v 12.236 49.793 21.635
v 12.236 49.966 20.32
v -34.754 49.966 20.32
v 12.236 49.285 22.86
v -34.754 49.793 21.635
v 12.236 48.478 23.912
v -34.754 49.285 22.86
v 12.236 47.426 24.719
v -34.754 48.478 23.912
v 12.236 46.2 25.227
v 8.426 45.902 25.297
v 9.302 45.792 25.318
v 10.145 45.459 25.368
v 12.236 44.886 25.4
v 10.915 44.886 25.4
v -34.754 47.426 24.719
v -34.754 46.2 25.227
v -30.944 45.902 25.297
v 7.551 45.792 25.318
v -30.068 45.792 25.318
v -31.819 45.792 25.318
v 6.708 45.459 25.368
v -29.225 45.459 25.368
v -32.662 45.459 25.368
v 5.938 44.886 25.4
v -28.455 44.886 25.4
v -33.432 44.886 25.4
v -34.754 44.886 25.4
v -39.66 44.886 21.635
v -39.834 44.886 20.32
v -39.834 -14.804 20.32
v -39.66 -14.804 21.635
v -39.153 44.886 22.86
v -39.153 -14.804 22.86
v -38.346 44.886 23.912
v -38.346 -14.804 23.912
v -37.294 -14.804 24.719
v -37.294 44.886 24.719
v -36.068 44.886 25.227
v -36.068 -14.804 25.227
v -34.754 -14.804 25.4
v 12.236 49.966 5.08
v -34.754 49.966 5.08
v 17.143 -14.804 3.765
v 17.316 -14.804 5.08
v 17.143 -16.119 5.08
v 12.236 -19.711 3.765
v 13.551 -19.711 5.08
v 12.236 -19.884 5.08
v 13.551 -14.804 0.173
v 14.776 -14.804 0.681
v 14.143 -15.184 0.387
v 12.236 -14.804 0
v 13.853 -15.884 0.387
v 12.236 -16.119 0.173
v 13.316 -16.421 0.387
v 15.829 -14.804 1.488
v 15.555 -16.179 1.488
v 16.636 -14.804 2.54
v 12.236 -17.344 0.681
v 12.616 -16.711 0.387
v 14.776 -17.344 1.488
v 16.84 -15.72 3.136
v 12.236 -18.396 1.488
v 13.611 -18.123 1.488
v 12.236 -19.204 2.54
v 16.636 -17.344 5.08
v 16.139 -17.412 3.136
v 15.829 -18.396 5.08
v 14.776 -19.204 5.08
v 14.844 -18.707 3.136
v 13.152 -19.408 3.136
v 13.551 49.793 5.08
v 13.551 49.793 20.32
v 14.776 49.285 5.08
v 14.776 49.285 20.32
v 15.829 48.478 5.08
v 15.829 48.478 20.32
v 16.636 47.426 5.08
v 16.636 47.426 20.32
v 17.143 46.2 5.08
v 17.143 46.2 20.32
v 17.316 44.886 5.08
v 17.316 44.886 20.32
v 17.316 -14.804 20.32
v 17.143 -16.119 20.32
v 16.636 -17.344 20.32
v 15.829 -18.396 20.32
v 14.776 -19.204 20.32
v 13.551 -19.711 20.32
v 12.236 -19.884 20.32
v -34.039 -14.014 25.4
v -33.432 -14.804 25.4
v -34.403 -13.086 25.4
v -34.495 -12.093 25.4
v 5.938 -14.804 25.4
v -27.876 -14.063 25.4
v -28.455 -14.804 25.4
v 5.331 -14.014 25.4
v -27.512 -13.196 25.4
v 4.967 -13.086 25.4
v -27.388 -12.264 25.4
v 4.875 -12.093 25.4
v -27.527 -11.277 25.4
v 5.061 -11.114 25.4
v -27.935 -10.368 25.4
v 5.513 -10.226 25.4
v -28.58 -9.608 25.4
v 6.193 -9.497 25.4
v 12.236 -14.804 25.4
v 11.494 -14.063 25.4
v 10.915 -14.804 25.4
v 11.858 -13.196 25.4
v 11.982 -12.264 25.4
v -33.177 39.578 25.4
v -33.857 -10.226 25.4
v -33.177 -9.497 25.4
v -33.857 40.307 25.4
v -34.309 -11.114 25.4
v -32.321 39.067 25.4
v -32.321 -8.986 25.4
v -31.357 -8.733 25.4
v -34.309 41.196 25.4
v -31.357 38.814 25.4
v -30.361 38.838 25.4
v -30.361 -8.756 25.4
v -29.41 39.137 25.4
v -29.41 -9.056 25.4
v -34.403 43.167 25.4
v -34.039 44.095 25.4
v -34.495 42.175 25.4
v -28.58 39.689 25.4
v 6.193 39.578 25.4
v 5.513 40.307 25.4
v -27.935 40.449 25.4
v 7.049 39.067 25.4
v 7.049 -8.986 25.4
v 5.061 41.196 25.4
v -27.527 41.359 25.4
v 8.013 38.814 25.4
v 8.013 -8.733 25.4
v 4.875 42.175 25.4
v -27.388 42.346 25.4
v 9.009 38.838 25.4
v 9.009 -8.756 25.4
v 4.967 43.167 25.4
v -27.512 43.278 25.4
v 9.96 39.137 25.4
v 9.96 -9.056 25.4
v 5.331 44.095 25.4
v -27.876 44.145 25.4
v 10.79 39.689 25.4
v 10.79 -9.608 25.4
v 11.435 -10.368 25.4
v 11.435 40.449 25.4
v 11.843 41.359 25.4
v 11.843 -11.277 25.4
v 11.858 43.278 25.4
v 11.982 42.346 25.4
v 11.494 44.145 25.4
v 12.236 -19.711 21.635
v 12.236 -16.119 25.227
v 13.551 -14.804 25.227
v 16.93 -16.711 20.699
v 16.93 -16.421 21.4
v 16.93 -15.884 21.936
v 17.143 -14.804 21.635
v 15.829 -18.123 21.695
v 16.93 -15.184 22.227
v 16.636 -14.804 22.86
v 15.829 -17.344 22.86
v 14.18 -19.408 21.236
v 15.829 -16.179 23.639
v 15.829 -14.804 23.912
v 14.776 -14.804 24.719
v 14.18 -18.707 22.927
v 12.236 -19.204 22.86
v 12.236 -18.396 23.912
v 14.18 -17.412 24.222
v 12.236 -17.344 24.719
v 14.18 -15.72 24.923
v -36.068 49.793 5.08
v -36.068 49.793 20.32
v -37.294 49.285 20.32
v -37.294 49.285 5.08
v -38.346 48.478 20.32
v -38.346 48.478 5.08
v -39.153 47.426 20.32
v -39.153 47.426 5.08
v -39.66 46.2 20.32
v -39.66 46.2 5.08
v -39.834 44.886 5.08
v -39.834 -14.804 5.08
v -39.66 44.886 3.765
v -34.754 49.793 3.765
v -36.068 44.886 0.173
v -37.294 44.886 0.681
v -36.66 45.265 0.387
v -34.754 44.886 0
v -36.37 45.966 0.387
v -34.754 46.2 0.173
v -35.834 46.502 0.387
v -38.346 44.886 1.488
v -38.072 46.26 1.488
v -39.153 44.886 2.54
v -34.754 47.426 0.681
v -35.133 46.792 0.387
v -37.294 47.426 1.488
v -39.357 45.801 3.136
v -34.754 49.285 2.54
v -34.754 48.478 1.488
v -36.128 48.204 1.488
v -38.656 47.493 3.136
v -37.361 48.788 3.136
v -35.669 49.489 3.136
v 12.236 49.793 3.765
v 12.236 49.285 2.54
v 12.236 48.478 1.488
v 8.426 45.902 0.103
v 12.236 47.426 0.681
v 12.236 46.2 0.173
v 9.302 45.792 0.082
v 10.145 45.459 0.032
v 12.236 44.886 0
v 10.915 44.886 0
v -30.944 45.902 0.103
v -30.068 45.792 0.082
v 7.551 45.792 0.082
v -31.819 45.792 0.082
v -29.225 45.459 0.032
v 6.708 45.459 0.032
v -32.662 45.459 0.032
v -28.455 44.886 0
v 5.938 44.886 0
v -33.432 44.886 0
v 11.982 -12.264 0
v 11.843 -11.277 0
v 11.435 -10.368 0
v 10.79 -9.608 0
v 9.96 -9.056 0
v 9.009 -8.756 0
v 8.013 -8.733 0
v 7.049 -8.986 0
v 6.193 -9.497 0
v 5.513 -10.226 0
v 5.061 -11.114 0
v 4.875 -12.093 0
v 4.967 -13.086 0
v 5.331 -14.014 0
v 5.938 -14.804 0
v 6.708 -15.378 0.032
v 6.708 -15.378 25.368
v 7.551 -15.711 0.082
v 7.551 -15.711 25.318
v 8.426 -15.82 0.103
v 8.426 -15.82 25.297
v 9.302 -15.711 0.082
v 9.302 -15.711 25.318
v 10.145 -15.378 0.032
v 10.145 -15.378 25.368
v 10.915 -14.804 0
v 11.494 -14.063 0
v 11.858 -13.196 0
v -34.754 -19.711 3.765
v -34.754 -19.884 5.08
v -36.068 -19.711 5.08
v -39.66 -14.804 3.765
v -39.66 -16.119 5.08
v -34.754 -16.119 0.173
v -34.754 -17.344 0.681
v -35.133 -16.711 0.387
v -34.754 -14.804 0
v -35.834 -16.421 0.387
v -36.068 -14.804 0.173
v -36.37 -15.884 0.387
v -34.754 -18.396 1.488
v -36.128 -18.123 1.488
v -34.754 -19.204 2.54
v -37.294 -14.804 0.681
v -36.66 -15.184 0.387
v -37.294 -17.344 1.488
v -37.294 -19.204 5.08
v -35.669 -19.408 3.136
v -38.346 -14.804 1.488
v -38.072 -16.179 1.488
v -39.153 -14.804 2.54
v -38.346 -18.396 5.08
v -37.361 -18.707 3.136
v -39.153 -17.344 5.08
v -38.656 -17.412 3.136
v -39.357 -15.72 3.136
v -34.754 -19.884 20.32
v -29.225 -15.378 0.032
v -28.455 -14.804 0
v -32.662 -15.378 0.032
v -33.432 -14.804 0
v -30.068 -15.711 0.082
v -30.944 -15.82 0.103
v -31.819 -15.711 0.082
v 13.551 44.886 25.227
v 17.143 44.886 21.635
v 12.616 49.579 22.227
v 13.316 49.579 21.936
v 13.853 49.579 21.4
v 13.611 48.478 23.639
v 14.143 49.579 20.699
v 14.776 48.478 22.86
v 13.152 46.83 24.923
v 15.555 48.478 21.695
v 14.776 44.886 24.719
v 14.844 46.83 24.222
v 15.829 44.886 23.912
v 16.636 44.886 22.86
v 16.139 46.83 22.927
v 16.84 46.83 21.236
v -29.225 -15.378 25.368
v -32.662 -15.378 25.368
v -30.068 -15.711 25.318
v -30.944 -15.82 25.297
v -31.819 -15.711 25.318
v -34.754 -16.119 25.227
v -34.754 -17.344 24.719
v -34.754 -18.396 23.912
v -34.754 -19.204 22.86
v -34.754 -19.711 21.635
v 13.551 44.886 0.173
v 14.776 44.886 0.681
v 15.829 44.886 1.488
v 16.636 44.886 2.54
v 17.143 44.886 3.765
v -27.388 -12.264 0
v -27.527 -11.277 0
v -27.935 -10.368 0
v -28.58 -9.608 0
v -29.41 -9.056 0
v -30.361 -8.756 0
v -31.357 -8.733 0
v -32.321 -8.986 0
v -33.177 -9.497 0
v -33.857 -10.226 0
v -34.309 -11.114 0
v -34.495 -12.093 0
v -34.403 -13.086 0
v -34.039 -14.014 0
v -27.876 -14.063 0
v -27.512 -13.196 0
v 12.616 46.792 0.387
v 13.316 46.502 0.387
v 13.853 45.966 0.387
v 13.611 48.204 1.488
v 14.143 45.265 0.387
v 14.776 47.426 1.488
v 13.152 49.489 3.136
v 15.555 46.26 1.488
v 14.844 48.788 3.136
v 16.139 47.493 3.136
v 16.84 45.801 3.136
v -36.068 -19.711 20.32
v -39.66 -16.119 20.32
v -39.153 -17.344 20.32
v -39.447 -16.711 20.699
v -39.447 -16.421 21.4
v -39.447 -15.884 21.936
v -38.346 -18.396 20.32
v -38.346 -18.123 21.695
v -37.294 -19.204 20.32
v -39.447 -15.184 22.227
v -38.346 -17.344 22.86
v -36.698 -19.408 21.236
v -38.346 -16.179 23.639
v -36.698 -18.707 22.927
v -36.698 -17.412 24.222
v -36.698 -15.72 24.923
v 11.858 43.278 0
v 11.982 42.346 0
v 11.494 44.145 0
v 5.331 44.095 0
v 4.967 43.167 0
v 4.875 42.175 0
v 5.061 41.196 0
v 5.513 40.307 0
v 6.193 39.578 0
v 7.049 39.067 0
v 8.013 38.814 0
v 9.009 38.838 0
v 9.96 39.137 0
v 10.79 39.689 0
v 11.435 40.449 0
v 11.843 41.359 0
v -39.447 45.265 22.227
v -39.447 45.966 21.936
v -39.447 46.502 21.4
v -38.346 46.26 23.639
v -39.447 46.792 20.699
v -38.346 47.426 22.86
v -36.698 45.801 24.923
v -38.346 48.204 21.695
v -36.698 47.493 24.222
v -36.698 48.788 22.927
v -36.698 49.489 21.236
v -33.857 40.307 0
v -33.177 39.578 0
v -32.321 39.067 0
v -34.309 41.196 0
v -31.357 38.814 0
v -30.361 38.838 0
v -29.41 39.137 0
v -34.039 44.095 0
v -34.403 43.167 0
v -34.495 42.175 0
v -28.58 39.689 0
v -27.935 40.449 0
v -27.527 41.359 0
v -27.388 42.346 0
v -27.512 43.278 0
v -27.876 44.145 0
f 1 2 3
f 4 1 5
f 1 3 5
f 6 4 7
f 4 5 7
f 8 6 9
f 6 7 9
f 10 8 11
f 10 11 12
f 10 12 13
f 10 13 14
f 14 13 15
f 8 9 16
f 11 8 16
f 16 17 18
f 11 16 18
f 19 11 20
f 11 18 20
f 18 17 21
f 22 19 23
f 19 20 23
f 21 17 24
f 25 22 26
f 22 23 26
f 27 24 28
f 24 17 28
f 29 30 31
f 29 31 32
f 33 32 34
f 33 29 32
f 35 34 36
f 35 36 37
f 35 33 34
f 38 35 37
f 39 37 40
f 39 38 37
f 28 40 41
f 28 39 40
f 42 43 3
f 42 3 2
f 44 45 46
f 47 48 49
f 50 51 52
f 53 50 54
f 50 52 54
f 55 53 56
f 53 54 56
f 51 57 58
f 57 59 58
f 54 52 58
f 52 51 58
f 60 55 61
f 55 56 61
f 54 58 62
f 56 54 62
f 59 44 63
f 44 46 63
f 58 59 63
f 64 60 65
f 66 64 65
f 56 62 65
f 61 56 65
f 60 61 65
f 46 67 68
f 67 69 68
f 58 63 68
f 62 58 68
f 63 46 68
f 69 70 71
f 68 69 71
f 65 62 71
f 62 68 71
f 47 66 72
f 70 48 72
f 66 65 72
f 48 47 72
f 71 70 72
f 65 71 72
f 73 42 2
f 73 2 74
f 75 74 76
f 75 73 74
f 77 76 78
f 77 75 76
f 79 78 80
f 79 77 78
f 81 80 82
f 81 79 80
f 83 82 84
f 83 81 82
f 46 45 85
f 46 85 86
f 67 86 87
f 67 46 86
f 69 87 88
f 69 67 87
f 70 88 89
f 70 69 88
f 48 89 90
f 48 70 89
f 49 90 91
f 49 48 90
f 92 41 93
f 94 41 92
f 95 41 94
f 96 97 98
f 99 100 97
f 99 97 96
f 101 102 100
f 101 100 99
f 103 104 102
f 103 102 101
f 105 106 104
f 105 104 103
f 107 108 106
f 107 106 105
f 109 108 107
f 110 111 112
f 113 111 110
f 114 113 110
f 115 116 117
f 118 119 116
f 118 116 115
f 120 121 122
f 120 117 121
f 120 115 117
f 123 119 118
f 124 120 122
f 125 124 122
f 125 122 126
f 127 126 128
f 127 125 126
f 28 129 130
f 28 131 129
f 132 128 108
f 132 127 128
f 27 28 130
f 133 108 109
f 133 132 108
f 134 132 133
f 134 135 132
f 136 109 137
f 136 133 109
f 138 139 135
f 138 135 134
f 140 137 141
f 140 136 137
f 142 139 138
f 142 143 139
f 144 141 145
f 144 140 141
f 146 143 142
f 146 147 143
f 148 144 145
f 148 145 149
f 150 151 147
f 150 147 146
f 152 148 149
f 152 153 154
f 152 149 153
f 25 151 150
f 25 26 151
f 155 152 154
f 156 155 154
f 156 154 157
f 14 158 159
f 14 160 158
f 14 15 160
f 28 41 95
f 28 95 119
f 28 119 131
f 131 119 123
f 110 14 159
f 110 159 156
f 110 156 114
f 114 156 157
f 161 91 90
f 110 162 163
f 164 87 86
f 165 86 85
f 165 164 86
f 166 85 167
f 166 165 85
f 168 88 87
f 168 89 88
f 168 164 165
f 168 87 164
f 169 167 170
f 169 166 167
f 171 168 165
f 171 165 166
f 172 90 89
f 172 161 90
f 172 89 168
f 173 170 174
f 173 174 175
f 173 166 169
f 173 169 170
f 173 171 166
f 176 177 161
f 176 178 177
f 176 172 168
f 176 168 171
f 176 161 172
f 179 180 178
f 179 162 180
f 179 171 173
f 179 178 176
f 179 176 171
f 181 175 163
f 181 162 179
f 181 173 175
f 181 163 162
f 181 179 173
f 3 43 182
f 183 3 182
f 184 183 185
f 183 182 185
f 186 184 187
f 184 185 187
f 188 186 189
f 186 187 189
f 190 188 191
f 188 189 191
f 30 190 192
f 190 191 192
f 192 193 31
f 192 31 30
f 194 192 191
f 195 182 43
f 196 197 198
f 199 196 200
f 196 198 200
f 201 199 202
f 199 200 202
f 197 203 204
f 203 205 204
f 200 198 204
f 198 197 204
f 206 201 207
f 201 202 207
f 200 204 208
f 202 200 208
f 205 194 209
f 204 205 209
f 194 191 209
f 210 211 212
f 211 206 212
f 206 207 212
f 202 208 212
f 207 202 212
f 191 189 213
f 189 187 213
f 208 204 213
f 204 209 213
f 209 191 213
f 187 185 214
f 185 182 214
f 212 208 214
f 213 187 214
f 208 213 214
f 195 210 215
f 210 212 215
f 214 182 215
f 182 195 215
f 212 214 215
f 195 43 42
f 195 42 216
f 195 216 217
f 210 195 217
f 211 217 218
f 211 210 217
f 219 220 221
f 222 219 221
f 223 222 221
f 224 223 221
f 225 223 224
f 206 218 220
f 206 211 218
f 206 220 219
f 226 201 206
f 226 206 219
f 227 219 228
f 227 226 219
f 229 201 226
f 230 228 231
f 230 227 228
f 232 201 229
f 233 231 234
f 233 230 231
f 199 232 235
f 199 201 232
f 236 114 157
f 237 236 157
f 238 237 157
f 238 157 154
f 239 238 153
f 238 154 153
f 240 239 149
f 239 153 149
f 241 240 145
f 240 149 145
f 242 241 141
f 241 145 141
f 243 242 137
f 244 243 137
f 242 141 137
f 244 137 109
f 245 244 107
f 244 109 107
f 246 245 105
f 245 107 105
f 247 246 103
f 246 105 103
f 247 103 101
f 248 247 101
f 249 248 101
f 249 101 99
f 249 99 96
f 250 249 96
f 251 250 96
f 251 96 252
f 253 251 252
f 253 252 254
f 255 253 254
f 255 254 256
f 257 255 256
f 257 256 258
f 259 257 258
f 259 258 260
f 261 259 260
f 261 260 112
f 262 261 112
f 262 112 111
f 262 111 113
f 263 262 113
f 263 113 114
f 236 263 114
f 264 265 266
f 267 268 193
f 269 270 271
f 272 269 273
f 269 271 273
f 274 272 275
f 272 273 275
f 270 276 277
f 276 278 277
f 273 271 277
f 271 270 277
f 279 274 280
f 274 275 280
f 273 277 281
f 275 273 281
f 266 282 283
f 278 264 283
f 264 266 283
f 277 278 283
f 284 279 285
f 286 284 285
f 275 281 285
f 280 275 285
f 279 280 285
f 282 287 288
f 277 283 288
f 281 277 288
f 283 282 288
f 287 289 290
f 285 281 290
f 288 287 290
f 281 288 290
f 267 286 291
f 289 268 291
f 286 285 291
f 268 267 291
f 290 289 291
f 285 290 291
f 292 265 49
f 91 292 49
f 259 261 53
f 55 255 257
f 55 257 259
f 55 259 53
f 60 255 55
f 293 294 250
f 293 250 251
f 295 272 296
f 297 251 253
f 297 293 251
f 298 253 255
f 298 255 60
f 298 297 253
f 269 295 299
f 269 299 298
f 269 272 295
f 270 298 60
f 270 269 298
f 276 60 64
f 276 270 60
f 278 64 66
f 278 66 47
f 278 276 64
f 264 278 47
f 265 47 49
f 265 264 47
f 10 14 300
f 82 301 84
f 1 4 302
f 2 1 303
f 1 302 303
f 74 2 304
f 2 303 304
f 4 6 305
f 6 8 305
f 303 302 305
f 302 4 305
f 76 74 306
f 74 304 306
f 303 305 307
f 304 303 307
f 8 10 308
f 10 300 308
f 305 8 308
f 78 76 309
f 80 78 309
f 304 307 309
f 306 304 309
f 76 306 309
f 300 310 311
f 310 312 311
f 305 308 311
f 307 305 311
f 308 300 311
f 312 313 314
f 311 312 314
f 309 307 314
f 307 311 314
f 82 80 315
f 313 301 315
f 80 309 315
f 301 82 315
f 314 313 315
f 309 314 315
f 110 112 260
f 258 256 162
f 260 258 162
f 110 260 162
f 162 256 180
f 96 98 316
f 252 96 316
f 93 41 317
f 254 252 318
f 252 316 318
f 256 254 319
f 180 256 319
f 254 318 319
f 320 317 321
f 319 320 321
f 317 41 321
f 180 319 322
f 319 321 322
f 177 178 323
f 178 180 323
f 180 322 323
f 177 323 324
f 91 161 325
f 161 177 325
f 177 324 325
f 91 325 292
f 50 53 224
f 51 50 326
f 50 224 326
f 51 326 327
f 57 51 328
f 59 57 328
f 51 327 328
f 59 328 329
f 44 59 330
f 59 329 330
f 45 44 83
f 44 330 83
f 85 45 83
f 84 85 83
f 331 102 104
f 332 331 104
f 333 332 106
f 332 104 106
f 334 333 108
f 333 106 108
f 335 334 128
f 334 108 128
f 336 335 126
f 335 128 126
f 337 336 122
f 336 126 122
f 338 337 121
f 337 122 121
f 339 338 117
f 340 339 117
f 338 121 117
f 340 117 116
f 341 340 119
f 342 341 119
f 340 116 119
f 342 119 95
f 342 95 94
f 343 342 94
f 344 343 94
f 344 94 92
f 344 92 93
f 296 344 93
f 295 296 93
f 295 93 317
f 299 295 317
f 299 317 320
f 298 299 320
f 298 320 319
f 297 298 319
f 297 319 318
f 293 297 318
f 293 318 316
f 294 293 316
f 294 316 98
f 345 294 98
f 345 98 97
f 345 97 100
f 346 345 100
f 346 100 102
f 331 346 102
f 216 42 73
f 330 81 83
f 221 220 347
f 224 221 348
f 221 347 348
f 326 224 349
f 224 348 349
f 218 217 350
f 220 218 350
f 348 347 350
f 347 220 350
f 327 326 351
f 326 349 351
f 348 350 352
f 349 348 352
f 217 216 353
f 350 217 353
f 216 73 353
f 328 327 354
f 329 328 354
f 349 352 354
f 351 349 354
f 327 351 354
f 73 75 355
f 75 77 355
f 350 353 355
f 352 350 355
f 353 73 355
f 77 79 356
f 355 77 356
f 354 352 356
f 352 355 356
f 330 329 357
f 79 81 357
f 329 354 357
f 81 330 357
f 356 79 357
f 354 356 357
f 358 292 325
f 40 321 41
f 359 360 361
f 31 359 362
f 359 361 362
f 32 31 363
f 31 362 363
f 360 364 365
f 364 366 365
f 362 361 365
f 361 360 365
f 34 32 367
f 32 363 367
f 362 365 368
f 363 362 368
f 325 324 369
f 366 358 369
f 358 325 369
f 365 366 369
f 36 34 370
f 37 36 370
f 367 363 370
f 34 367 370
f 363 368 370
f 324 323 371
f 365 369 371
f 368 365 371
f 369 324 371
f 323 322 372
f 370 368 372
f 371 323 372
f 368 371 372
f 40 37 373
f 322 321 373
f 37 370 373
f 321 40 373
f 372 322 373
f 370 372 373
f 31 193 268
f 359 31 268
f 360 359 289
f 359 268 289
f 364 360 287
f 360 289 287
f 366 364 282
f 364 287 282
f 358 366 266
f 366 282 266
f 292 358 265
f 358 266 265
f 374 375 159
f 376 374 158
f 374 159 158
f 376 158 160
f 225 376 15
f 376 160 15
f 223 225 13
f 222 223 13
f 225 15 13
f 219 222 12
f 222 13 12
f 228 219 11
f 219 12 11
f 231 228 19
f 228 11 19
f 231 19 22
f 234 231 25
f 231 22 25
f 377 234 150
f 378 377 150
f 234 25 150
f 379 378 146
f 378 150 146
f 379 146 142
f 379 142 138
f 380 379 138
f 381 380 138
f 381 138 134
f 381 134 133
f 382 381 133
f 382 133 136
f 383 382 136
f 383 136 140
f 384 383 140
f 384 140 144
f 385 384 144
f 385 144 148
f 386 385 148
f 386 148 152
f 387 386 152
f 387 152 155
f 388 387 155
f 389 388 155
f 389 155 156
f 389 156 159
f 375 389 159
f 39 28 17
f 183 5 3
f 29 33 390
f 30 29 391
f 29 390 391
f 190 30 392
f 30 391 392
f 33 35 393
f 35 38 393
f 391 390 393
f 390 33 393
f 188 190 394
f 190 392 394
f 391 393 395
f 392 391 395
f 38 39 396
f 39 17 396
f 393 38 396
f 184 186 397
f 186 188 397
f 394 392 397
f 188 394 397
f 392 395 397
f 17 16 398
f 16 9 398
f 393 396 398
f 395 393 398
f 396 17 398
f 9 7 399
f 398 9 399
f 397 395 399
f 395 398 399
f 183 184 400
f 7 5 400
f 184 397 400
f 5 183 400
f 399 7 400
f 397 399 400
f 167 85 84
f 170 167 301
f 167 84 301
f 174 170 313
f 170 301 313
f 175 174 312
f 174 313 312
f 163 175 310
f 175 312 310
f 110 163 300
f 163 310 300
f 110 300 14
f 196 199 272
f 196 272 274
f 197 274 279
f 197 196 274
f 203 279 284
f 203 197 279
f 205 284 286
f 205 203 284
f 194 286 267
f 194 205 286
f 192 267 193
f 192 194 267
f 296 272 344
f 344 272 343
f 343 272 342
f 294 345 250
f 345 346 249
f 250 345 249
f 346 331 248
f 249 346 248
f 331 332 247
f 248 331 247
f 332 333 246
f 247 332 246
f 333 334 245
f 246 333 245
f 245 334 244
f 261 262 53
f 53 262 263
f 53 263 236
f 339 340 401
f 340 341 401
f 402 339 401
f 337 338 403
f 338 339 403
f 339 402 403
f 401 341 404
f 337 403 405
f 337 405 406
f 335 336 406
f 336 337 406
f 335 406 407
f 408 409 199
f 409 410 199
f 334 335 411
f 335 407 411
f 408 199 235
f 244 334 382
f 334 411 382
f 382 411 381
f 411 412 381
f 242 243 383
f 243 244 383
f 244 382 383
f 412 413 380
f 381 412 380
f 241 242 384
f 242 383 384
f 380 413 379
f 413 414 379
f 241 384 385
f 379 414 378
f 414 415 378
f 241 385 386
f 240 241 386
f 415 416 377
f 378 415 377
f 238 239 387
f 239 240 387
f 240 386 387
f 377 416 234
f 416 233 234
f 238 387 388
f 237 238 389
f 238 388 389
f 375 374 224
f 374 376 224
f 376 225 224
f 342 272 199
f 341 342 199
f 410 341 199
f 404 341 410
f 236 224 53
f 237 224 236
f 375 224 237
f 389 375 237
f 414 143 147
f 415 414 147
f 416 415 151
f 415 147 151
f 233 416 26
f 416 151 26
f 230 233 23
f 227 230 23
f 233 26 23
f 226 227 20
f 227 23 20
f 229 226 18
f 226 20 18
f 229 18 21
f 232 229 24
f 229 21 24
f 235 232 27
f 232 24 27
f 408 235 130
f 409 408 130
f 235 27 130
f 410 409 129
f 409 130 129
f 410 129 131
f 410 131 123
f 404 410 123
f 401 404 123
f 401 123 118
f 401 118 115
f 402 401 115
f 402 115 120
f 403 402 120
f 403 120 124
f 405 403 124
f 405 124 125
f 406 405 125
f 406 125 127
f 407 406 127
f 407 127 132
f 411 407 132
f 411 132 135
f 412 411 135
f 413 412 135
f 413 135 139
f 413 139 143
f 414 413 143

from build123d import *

# Parameters (mm, degrees)
F0_W         = 57.15
F0_H         = 69.85
F1_DEPTH     = 25.4
F2_R         = 3.556
F3_DEPTH     = 25.4
F4_T1_DEPTH  = 82.55
F5_T1_DEPTH  = 77.47
F5_T3_DEPTH  = 33.02
F5_T6_ANGLE  = 89.9999999979
F6_T1_DEPTH  = 64.77
F6_T3_DEPTH  = 33.02
F6_T6_ANGLE  = 89.9999999979
F7_T1_DEPTH  = 59.69
F7_T3_DEPTH  = 33.02
F7_T6_ANGLE  = 89.9999999979
F7_T8_ANGLE  = 89.9999999979
F8_T1_DEPTH  = 59.69
F8_T3_DEPTH  = 46.99
F8_T6_ANGLE  = 89.9999999979
F8_T8_ANGLE  = 90.0000000017
F8_T10_ANGLE = 90.0000000017
F8_T12_ANGLE = 89.9999999979


# Not quite as in the source:
# - a fillet or chamfer that OpenCascade refuses, or shapes differently, is made with other operations: its cross-section is extruded or revolved along the edge and cut away or added


with BuildPart() as f1:
    # F0 (on Top) → F1 (new body)
    with BuildSketch(Plane.XY):
        with Locations((-11.2585859209, 15.0406121326)):
            Rectangle(F0_W, F0_H)
    extrude(amount=F1_DEPTH)

    # F2 (on face) → F3 (cut)
    with BuildSketch(Plane.XY.offset(25.4)):
        with Locations((-30.9435859209, 42.3456121326)):
            Circle(F2_R)
        with Locations((8.4264140791, 42.3456121326)):
            Circle(F2_R)
        with Locations((-30.9435859209, -12.2643878674)):
            Circle(F2_R)
        with Locations((8.4264140791, -12.2643878674)):
            Circle(F2_R)
    extrude(amount=-F3_DEPTH, mode=Mode.SUBTRACT)

    # F4: fillet of radius 5.08 on 1 edges, made by hand

    # F4_s2 → F4_t1 (cut)
    with BuildSketch(Plane.YZ.offset(-52.5335859209)):
        with BuildLine():
            ThreePointArc((-14.8043878674, 25.4), (-18.3964903158, 23.9121024484), (-19.8843878674, 20.32))
            Line((-19.8843878674, 20.32), (-19.8843878674, 25.4))
            Line((-19.8843878674, 25.4), (-14.8043878674, 25.4))
        make_face()
    extrude(amount=F4_T1_DEPTH, mode=Mode.SUBTRACT)

    # F5: fillet of radius 5.08 on 1 edges, made by hand

    # F5_s2 → F5_t1 (cut)
    with BuildSketch(Plane.XZ.offset(-62.6656121326)):
        with BuildLine():
            ThreePointArc((17.3164140791, 20.32), (15.8285165275, 23.9121024484), (12.2364140791, 25.4))
            Line((12.2364140791, 25.4), (17.3164140791, 25.4))
            Line((17.3164140791, 25.4), (17.3164140791, 20.32))
        make_face()
    extrude(amount=F5_T1_DEPTH, mode=Mode.SUBTRACT)

    # F5_s4 → F5_t3 (cut)
    with BuildSketch(Plane.XY.offset(-12.7)):
        with BuildLine():
            ThreePointArc((17.3164140791, -14.8043878674), (15.8285165275, -18.3964903158), (12.2364140791, -19.8843878674))
            Line((12.2364140791, -19.8843878674), (17.3164140791, -19.8843878674))
            Line((17.3164140791, -19.8843878674), (17.3164140791, -14.8043878674))
        make_face()
    extrude(amount=F5_T3_DEPTH, mode=Mode.SUBTRACT)

    # F5_s5 → F5_t6 (revolve, cut)
    with BuildSketch(Plane.XY.offset(20.3199999999)):
        with BuildLine():
            ThreePointArc((17.3164140791, -14.8043878674), (15.8285165275, -18.3964903158), (12.2364140791, -19.8843878674))
            Line((12.2364140791, -19.8843878674), (17.3164140791, -19.8843878674))
            Line((17.3164140791, -19.8843878674), (17.3164140791, -14.8043878674))
        make_face()
    revolve(axis=Axis((17.3164140791, -14.8043878673, 20.3199999999), (-1, 0, 0)), revolution_arc=F5_T6_ANGLE, mode=Mode.SUBTRACT)

    # F6: fillet of radius 5.08 on 1 edges, made by hand

    # F6_s2 → F6_t1 (cut)
    with BuildSketch(Plane.YZ.offset(-52.5335859209)):
        with BuildLine():
            ThreePointArc((49.9656121326, 20.32), (48.477714581, 23.9121024484), (44.8856121326, 25.4))
            Line((44.8856121326, 25.4), (49.9656121326, 25.4))
            Line((49.9656121326, 25.4), (49.9656121326, 20.32))
        make_face()
    extrude(amount=F6_T1_DEPTH, mode=Mode.SUBTRACT)

    # F6_s4 → F6_t3 (cut)
    with BuildSketch(Plane.XY.offset(-12.7)):
        with BuildLine():
            ThreePointArc((12.2364140791, 49.9656121326), (15.8285165275, 48.477714581), (17.3164140791, 44.8856121326))
            Line((17.3164140791, 44.8856121326), (17.3164140791, 49.9656121326))
            Line((17.3164140791, 49.9656121326), (12.2364140791, 49.9656121326))
        make_face()
    extrude(amount=F6_T3_DEPTH, mode=Mode.SUBTRACT)

    # F6_s5 → F6_t6 (revolve, cut)
    with BuildSketch(Plane.YZ.offset(12.236414079)):
        with BuildLine():
            ThreePointArc((49.9656121326, 20.32), (48.477714581, 23.9121024484), (44.8856121326, 25.4))
            Line((44.8856121326, 25.4), (49.9656121326, 25.4))
            Line((49.9656121326, 25.4), (49.9656121326, 20.32))
        make_face()
    revolve(axis=Axis((12.236414079, 49.9656121326, 20.3199999999), (0, 1, 0)), revolution_arc=F6_T6_ANGLE, mode=Mode.SUBTRACT)

    # F7: fillet of radius 5.08 on 1 edges, made by hand

    # F7_s2 → F7_t1 (cut)
    with BuildSketch(Plane.XZ.offset(-44.8856121326)):
        with BuildLine():
            ThreePointArc((-39.8335859209, 20.32), (-38.3456883694, 23.9121024484), (-34.7535859209, 25.4))
            Line((-34.7535859209, 25.4), (-39.8335859209, 25.4))
            Line((-39.8335859209, 25.4), (-39.8335859209, 20.32))
        make_face()
    extrude(amount=F7_T1_DEPTH, mode=Mode.SUBTRACT)

    # F7_s4 → F7_t3 (cut)
    with BuildSketch(Plane.XY.offset(-12.7)):
        with BuildLine():
            ThreePointArc((-39.8335859209, -14.8043878674), (-38.3456883694, -18.3964903158), (-34.7535859209, -19.8843878674))
            Line((-34.7535859209, -19.8843878674), (-39.8335859209, -19.8843878674))
            Line((-39.8335859209, -19.8843878674), (-39.8335859209, -14.8043878674))
        make_face()
        with BuildLine():
            ThreePointArc((-34.7535859209, 49.9656121326), (-38.3456883694, 48.477714581), (-39.8335859209, 44.8856121326))
            Line((-39.8335859209, 44.8856121326), (-39.8335859209, 49.9656121326))
            Line((-39.8335859209, 49.9656121326), (-34.7535859209, 49.9656121326))
        make_face()
    extrude(amount=F7_T3_DEPTH, mode=Mode.SUBTRACT)

    # F7_s5 → F7_t6 (revolve, cut)
    with BuildSketch(Plane.XZ.offset(-44.8856121325)):
        with BuildLine():
            ThreePointArc((-39.8335859209, 20.32), (-38.3456883694, 23.9121024484), (-34.7535859209, 25.4))
            Line((-34.7535859209, 25.4), (-39.8335859209, 25.4))
            Line((-39.8335859209, 25.4), (-39.8335859209, 20.32))
        make_face()
    revolve(axis=Axis((-39.8335859209, 44.8856121325, 20.3199999999), (-1, 0, 0)), revolution_arc=F7_T6_ANGLE, mode=Mode.SUBTRACT)

    # F7_s7 → F7_t8 (revolve, cut)
    with BuildSketch(Plane.XY.offset(20.3199999999)):
        with BuildLine():
            ThreePointArc((-39.8335859209, -14.8043878674), (-38.3456883694, -18.3964903158), (-34.7535859209, -19.8843878674))
            Line((-34.7535859209, -19.8843878674), (-39.8335859209, -19.8843878674))
            Line((-39.8335859209, -19.8843878674), (-39.8335859209, -14.8043878674))
        make_face()
    revolve(axis=Axis((-39.8335859209, -14.8043878673, 20.3199999999), (-1, 0, 0)), revolution_arc=F7_T8_ANGLE, mode=Mode.SUBTRACT)

    # F8: fillet of radius 5.08 on 8 edges, made by hand

    # F8_s2 → F8_t1 (cut)
    with BuildSketch(Plane.XZ.offset(-44.8856121326)):
        with BuildLine():
            ThreePointArc((-34.7535859209, 0), (-38.3456883694, 1.4878975516), (-39.8335859209, 5.08))
            Line((-39.8335859209, 5.08), (-39.8335859209, 0))
            Line((-39.8335859209, 0), (-34.7535859209, 0))
        make_face()
        with BuildLine():
            ThreePointArc((12.2364140791, 0), (15.8285165275, 1.4878975516), (17.3164140791, 5.08))
            Line((17.3164140791, 5.08), (17.3164140791, 0))
            Line((17.3164140791, 0), (12.2364140791, 0))
        make_face()
    extrude(amount=F8_T1_DEPTH, mode=Mode.SUBTRACT)

    # F8_s4 → F8_t3 (cut)
    with BuildSketch(Plane.YZ.offset(-34.7535859209)):
        with BuildLine():
            ThreePointArc((49.9656121326, 5.08), (48.477714581, 1.4878975516), (44.8856121326, 0))
            Line((44.8856121326, 0), (49.9656121326, 0))
            Line((49.9656121326, 0), (49.9656121326, 5.08))
        make_face()
        with BuildLine():
            ThreePointArc((-14.8043878674, 0), (-18.3964903158, 1.4878975516), (-19.8843878674, 5.08))
            Line((-19.8843878674, 5.08), (-19.8843878674, 0))
            Line((-19.8843878674, 0), (-14.8043878674, 0))
        make_face()
    extrude(amount=F8_T3_DEPTH, mode=Mode.SUBTRACT)

    # F8_s5 → F8_t6 (revolve, cut)
    with BuildSketch(Plane.XZ.offset(14.8043878673)):
        with BuildLine():
            ThreePointArc((12.2364140791, 0), (15.8285165275, 1.4878975516), (17.3164140791, 5.08))
            Line((17.3164140791, 5.08), (17.3164140791, 0))
            Line((17.3164140791, 0), (12.2364140791, 0))
        make_face()
    revolve(axis=Axis((12.236414079, -14.8043878673, 0), (0, 0, -1)), revolution_arc=F8_T6_ANGLE, mode=Mode.SUBTRACT)

    # F8_s7 → F8_t8 (revolve, cut)
    with BuildSketch(Plane.YZ.offset(-34.753585921)):
        with BuildLine():
            ThreePointArc((-14.8043878674, 0), (-18.3964903158, 1.4878975516), (-19.8843878674, 5.08))
            Line((-19.8843878674, 5.08), (-19.8843878674, 0))
            Line((-19.8843878674, 0), (-14.8043878674, 0))
        make_face()
    revolve(axis=Axis((-34.753585921, -14.8043878675, 0), (0, 0, -1)), revolution_arc=F8_T8_ANGLE, mode=Mode.SUBTRACT)

    # F8_s9 → F8_t10 (revolve, cut)
    with BuildSketch(Plane.XZ.offset(-44.8856121327)):
        with BuildLine():
            ThreePointArc((-34.7535859209, 0), (-38.3456883693, 1.4878975516), (-39.8335859209, 5.08))
            Line((-39.8335859209, 5.08), (-39.8335859209, 0))
            Line((-39.8335859209, 0), (-34.7535859209, 0))
        make_face()
    revolve(axis=Axis((-34.753585921, 44.8856121327, 0), (0, 0, -1)), revolution_arc=F8_T10_ANGLE, mode=Mode.SUBTRACT)

    # F8_s11 → F8_t12 (revolve, cut)
    with BuildSketch(Plane.YZ.offset(12.236414079)):
        with BuildLine():
            ThreePointArc((44.8856121326, 0), (48.477714581, 1.4878975516), (49.9656121326, 5.08))
            Line((49.9656121326, 5.08), (49.9656121326, 0))
            Line((49.9656121326, 0), (44.8856121326, 0))
        make_face()
    revolve(axis=Axis((12.236414079, 44.8856121325, 0), (0, 0, -1)), revolution_arc=F8_T12_ANGLE, mode=Mode.SUBTRACT)


solid = f1.part
